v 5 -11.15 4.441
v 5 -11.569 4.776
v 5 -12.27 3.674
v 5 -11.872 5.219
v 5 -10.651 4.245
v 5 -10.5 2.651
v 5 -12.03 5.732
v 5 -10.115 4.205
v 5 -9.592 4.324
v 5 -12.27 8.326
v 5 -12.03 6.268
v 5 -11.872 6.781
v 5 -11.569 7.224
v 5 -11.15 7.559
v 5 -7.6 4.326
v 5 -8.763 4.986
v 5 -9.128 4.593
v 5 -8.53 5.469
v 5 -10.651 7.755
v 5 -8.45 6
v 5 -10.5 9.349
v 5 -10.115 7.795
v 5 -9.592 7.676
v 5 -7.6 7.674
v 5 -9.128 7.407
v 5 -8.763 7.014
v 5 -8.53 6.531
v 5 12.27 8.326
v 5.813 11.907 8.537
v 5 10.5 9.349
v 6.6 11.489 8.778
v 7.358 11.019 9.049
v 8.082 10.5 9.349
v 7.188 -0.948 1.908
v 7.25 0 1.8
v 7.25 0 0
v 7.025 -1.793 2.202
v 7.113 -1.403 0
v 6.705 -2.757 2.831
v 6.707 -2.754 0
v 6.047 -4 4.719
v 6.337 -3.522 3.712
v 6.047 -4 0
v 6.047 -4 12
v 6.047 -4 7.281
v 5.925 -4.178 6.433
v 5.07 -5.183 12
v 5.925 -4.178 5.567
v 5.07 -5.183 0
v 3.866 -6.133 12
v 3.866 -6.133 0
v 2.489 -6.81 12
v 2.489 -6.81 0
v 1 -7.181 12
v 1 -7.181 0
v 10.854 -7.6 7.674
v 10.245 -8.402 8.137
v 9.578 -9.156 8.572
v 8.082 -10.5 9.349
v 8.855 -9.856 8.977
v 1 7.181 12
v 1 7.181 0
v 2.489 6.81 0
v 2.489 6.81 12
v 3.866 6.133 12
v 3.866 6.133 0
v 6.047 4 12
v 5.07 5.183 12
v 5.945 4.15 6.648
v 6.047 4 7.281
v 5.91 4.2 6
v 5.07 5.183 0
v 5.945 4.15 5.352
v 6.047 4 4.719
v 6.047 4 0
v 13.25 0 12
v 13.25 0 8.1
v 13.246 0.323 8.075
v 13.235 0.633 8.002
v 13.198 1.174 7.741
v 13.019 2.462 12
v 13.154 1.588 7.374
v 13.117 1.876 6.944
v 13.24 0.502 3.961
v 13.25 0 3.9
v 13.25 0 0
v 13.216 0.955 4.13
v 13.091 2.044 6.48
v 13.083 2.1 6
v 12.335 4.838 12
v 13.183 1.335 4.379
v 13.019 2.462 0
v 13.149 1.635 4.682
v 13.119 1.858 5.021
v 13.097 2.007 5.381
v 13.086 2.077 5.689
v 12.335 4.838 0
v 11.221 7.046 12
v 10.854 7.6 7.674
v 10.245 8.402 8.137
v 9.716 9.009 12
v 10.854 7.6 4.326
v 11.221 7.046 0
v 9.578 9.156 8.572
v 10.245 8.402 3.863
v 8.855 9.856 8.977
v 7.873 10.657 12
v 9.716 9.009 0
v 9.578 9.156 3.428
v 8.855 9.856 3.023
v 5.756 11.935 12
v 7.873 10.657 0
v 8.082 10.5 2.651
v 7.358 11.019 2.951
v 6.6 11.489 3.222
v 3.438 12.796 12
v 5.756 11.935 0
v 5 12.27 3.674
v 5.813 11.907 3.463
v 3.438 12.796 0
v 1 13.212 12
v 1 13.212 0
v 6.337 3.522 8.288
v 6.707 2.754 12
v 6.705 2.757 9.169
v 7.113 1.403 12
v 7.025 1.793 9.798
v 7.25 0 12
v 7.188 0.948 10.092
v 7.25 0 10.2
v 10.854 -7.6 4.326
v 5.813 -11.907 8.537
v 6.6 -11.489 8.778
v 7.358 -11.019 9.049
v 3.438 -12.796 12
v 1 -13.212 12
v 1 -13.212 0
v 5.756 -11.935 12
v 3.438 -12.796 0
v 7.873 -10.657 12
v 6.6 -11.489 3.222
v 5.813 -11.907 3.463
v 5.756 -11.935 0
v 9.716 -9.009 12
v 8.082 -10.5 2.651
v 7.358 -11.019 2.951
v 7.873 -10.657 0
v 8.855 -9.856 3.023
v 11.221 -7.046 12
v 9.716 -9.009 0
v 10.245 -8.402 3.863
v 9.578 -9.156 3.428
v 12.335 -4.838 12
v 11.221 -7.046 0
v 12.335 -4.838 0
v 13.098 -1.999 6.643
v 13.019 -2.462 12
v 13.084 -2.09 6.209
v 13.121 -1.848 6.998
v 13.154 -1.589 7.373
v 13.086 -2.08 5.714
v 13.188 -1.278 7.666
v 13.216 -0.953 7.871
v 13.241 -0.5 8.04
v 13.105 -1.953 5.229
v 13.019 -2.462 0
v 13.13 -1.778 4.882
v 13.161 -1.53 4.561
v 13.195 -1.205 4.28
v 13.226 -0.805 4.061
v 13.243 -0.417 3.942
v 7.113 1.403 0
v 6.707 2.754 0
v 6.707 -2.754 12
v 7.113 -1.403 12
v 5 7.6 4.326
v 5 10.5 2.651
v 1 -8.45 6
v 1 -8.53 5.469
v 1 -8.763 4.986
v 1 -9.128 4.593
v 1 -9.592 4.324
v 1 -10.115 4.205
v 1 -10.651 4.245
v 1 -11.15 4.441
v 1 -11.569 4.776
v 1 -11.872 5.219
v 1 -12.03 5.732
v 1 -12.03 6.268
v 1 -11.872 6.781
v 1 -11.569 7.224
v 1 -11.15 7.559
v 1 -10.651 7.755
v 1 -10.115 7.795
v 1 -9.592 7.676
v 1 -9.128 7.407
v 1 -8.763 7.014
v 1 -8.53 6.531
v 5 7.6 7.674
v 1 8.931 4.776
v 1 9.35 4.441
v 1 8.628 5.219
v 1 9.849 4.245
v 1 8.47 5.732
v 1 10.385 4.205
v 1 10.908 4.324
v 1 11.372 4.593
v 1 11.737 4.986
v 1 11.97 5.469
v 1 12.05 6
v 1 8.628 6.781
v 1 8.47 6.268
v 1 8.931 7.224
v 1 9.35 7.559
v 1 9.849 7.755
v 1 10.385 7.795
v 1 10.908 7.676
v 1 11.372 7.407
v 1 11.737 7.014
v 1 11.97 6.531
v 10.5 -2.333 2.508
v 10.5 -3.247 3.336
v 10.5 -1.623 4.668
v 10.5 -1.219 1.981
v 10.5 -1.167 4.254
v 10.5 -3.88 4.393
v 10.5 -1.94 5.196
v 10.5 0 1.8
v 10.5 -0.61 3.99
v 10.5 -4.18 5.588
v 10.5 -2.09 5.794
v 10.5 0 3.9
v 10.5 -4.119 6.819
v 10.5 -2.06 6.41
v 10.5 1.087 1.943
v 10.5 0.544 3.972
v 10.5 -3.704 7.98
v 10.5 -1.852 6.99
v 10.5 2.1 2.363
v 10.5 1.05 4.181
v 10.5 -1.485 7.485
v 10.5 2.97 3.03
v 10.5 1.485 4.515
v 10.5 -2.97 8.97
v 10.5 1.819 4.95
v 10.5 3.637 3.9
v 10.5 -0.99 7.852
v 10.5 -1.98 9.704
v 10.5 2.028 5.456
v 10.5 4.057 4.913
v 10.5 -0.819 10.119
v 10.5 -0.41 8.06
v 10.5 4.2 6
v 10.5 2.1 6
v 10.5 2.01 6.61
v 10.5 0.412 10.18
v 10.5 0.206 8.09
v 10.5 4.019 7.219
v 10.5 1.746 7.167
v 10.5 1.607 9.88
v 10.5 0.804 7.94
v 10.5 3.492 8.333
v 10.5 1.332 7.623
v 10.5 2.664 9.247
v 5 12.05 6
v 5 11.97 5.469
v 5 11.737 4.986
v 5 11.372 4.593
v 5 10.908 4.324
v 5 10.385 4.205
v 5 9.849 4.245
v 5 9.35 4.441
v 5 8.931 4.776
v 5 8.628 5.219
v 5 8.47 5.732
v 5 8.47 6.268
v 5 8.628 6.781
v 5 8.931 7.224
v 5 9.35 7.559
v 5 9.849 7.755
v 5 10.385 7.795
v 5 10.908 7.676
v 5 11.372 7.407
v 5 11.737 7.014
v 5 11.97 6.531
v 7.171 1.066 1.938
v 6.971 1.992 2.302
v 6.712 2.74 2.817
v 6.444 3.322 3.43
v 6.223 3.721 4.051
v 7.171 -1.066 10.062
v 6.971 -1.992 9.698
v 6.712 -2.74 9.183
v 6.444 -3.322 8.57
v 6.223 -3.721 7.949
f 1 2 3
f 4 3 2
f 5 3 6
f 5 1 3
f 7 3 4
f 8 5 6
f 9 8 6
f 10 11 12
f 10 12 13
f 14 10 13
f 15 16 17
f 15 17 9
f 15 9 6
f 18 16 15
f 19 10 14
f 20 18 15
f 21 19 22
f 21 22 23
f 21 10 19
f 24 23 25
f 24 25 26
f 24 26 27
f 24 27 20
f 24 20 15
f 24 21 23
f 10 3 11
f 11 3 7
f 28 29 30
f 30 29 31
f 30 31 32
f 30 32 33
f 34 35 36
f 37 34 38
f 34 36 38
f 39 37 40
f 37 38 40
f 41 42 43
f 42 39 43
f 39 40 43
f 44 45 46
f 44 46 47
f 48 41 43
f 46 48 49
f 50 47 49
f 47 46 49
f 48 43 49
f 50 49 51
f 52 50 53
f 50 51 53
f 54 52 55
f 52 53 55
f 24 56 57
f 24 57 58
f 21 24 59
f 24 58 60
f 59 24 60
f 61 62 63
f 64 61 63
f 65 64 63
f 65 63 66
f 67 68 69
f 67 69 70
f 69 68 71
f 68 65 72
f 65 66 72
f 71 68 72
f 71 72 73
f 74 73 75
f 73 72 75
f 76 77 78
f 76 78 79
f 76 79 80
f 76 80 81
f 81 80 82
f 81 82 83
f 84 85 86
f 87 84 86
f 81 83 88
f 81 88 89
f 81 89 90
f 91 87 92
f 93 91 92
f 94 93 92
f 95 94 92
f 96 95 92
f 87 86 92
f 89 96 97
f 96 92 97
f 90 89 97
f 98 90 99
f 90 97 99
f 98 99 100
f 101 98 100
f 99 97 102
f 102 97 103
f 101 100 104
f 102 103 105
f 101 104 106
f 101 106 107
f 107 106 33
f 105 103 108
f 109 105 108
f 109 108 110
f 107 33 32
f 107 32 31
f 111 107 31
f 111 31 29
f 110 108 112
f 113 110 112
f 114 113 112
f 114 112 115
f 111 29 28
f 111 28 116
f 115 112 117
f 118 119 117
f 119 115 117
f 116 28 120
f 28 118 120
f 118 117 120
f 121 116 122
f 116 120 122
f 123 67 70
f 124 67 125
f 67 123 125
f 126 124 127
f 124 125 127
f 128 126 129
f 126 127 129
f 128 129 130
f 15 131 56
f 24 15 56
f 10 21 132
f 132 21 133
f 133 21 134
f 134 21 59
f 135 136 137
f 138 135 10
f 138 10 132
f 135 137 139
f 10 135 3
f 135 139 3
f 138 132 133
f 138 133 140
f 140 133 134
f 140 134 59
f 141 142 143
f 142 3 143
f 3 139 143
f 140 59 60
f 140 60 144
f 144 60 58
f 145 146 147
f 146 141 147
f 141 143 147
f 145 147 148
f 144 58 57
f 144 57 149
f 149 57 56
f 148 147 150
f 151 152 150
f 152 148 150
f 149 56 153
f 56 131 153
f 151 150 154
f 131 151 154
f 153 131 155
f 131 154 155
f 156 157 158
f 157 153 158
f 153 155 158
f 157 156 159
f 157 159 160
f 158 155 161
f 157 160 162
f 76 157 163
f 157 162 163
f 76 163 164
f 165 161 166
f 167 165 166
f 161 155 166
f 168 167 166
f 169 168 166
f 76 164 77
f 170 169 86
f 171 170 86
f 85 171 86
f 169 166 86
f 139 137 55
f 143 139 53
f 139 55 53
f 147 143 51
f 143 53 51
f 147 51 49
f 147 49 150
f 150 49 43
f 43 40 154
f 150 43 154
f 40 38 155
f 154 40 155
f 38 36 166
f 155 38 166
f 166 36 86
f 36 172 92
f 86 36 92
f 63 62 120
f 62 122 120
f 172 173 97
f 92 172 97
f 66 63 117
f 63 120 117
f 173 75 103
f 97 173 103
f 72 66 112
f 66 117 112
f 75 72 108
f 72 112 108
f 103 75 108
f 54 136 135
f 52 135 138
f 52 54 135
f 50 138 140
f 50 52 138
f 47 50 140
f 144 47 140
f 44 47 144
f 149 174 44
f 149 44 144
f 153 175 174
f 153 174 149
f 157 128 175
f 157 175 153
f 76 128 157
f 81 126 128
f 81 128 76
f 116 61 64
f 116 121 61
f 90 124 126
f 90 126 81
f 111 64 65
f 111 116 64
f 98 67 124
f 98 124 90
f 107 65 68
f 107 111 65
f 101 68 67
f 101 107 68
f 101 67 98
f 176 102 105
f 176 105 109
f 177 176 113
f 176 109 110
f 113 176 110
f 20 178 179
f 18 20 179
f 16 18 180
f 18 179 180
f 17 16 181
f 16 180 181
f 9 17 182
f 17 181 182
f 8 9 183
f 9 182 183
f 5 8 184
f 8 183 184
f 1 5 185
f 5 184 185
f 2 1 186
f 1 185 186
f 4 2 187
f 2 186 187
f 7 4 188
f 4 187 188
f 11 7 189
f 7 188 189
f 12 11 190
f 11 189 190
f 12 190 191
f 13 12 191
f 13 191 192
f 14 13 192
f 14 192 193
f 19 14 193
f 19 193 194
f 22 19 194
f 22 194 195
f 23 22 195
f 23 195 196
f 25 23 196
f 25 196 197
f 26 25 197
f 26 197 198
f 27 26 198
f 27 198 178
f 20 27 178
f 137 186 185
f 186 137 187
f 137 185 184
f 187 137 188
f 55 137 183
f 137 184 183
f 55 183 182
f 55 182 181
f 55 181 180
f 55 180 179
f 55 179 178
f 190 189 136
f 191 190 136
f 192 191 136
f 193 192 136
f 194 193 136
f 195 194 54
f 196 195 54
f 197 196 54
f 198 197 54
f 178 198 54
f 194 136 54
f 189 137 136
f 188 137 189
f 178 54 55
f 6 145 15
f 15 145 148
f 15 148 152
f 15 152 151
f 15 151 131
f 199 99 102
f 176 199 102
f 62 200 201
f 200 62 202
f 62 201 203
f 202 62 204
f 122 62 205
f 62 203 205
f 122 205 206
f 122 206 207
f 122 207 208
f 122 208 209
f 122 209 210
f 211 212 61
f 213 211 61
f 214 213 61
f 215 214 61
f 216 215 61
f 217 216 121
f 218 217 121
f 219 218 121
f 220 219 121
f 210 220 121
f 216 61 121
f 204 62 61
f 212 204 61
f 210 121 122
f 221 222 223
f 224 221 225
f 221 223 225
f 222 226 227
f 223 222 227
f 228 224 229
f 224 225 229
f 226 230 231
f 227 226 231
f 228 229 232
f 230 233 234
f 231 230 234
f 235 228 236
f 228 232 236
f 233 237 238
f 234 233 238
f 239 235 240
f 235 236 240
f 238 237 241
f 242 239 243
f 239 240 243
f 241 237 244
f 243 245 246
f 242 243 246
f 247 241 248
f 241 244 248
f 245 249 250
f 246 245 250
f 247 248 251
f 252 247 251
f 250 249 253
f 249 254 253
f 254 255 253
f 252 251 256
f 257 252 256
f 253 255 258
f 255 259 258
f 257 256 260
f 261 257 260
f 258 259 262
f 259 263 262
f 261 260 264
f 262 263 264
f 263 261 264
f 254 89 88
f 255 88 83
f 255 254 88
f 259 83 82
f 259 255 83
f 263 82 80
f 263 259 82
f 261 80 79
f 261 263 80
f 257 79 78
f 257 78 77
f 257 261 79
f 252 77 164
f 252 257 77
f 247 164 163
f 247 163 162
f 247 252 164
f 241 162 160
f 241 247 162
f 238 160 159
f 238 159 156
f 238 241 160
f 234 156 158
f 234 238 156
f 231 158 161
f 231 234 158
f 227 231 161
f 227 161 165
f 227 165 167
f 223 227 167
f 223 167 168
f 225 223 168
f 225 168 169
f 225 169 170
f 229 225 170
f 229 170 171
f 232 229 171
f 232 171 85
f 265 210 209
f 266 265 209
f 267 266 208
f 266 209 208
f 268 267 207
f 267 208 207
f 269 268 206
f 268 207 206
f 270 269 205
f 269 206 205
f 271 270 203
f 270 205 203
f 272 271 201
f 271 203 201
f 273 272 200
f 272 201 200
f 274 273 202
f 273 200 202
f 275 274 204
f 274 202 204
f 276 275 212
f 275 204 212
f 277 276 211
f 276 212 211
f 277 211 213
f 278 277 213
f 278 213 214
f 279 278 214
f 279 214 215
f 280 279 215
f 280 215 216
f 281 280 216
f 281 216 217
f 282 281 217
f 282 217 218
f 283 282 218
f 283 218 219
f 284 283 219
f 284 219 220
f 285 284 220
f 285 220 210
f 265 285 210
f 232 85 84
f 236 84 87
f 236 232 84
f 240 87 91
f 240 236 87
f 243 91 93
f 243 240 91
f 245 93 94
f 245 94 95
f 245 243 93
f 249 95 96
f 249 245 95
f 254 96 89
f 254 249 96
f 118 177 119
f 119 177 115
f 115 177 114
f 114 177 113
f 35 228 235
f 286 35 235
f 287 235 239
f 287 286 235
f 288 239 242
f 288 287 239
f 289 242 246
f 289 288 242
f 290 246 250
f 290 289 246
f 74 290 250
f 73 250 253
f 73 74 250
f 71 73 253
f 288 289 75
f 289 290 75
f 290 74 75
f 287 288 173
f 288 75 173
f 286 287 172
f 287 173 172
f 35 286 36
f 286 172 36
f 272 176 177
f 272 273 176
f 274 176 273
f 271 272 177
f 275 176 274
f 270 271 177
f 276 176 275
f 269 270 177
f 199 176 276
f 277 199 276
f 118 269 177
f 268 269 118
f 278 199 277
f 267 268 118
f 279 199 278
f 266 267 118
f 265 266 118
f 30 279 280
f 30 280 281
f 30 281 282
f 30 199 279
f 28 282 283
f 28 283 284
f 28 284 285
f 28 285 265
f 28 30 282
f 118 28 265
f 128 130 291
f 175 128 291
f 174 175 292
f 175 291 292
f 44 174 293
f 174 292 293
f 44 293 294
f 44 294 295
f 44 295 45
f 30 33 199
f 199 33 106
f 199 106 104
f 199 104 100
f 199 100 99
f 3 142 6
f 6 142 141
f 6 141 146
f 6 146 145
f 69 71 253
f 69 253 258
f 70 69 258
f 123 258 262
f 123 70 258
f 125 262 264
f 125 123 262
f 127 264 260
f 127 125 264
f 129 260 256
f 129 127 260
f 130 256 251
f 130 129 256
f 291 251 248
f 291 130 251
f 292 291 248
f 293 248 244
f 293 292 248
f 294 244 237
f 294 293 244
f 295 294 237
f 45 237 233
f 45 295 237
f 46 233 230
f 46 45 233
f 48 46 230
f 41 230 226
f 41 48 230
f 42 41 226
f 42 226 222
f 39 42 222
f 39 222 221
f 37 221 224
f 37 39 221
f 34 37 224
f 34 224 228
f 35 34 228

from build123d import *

# Parameters (mm, degrees)
F1_DEPTH  = 12
F3_DEPTH  = 10.5
F4_DEPTH  = 25
F7_DEPTH  = 25
F9_DEPTH  = 25
F12_DEPTH = 8
F13_W     = 1
F13_H     = 20
F13_H_2   = 18.9817659557
F14_DEPTH = 12.5


with BuildPart() as f1:
    # F0 (on Top) → F1 (new body)
    with BuildSketch(Plane.XY):
        with BuildLine():
            Line((11.25, 4), (11.25, 0))
            Line((11.25, 0), (11.25, -4))
            Line((11.25, -4), (10.5148704224, -4))
            ThreePointArc((10.5148704224, -4), (6.3860198872, -9.2618167764), (0, -11.25))
            Line((0, -11.25), (0, -13.25))
            ThreePointArc((0, -13.25), (9.3691648507, -9.3691648507), (13.25, 0))
            ThreePointArc((13.25, 0), (9.3691648507, 9.3691648507), (0, 13.25))
            Line((0, 13.25), (0, 11.25))
            ThreePointArc((0, 11.25), (6.3860198872, 9.2618167764), (10.5148704224, 4))
            Line((10.5148704224, 4), (11.25, 4))
        make_face()
        with BuildLine():
            Line((10.5148704224, -4), (6.0466933112, -4))
            ThreePointArc((6.0466933112, -4), (3.4323825544, -6.3860198872), (0, -7.25))
            Line((0, -7.25), (0, -11.25))
            ThreePointArc((0, -11.25), (6.3860198872, -9.2618167764), (10.5148704224, -4))
        make_face()
        with BuildLine():
            Line((11.25, 0), (7.25, 0))
            ThreePointArc((7.25, 0), (6.9426589469, -2.0885369872), (6.0466933112, -4))
            Line((6.0466933112, -4), (10.5148704224, -4))
            ThreePointArc((10.5148704224, -4), (11.0646914158, -2.0334954817), (11.25, 0))
        make_face()
        with BuildLine():
            ThreePointArc((6.0466933112, 4), (6.9426589469, 2.0885369872), (7.25, 0))
            Line((7.25, 0), (11.25, 0))
            ThreePointArc((11.25, 0), (11.0646914158, 2.0334954817), (10.5148704224, 4))
            Line((10.5148704224, 4), (6.0466933112, 4))
        make_face()
        with BuildLine():
            ThreePointArc((10.5148704224, 4), (11.0646914158, 2.0334954817), (11.25, 0))
            Line((11.25, 0), (11.25, 4))
            Line((11.25, 4), (10.5148704224, 4))
        make_face()
        with BuildLine():
            Line((11.25, -4), (11.25, 0))
            ThreePointArc((11.25, 0), (11.0646914158, -2.0334954817), (10.5148704224, -4))
            Line((10.5148704224, -4), (11.25, -4))
        make_face()
        with BuildLine():
            ThreePointArc((0, 7.25), (3.4323825544, 6.3860198872), (6.0466933112, 4))
            Line((6.0466933112, 4), (10.5148704224, 4))
            ThreePointArc((10.5148704224, 4), (6.3860198872, 9.2618167764), (0, 11.25))
            Line((0, 11.25), (0, 7.25))
        make_face()
    extrude(amount=F1_DEPTH)

    # F2 (on Right) → F3 (cut)
    with BuildSketch(Plane.YZ):
        with BuildLine():
            ThreePointArc((4.2, 6), (-2.969848481, 8.969848481), (0, 1.8))
            ThreePointArc((0, 1.8), (2.969848481, 3.030151519), (4.2, 6))
        make_face()
        with BuildLine():
            ThreePointArc((2.1, 6), (1.4849242405, 4.5150757595), (0, 3.9))
            ThreePointArc((0, 3.9), (-1.4849242405, 7.4849242405), (2.1, 6))
        make_face(mode=Mode.SUBTRACT)
        with BuildLine():
            ThreePointArc((2.1, 6), (-1.4849242405, 7.4849242405), (0, 3.9))
            ThreePointArc((0, 3.9), (1.4849242405, 4.5150757595), (2.1, 6))
        make_face()
    extrude(amount=F3_DEPTH, mode=Mode.SUBTRACT)

    # F2 (on Right) → F4 (cut)
    with BuildSketch(Plane.YZ):
        with BuildLine():
            ThreePointArc((2.1, 6), (-1.4849242405, 7.4849242405), (0, 3.9))
            ThreePointArc((0, 3.9), (1.4849242405, 4.5150757595), (2.1, 6))
        make_face()
    extrude(amount=F4_DEPTH, mode=Mode.SUBTRACT)

    # F6 (on face) → F7 (cut)
    with BuildSketch(Plane(origin=(0, 0, 0), x_dir=(0, -1, 0), z_dir=(-1, 0, 0))):
        with BuildLine():
            ThreePointArc((12.05, 6), (10.25, 7.8), (8.45, 6))
            Line((8.45, 6), (12.05, 6))
        make_face()
        with BuildLine():
            Line((12.05, 6), (8.45, 6))
            ThreePointArc((8.45, 6), (10.25, 4.2), (12.05, 6))
        make_face()
    extrude(amount=-F7_DEPTH, mode=Mode.SUBTRACT)

    # F8 (on face) → F9 (cut)
    with BuildSketch(Plane(origin=(0, 0, 0), x_dir=(0, -1, 0), z_dir=(-1, 0, 0))):
        with BuildLine():
            Line((-12.05, 6), (-8.45, 6))
            ThreePointArc((-8.45, 6), (-10.25, 7.8), (-12.05, 6))
        make_face()
        with BuildLine():
            ThreePointArc((-12.05, 6), (-10.25, 4.2), (-8.45, 6))
            Line((-8.45, 6), (-12.05, 6))
        make_face()
    extrude(amount=-F9_DEPTH, mode=Mode.SUBTRACT)

    # F11 (on offset) → F12 (cut)
    with BuildSketch(Plane.YZ.offset(13)):
        Polygon((-7.6, 4.3256842194), (-7.6, 6), (-7.6, 7.6743157806), (-10.5, 9.3486315613), (-13.4, 7.6743157806), (-13.4, 4.3256842194), (-10.5, 2.6513684387), align=None)
        Polygon((7.6, 7.6743157806), (7.6, 6), (7.6, 4.3256842194), (10.5, 2.6513684387), (13.4, 4.3256842194), (13.4, 7.6743157806), (10.5, 9.3486315613), align=None)
    extrude(amount=-F12_DEPTH, mode=Mode.SUBTRACT)

    # F13 (on Top) → F14 (cut, symmetric)
    with BuildSketch(Plane.XY):
        with Locations((0.5, 10)):
            Rectangle(F13_W, F13_H)
        with Locations((0.5, -9.4908829778)):
            Rectangle(F13_W, F13_H_2)
    extrude(amount=F14_DEPTH, both=True, mode=Mode.SUBTRACT)


solid = f1.part
